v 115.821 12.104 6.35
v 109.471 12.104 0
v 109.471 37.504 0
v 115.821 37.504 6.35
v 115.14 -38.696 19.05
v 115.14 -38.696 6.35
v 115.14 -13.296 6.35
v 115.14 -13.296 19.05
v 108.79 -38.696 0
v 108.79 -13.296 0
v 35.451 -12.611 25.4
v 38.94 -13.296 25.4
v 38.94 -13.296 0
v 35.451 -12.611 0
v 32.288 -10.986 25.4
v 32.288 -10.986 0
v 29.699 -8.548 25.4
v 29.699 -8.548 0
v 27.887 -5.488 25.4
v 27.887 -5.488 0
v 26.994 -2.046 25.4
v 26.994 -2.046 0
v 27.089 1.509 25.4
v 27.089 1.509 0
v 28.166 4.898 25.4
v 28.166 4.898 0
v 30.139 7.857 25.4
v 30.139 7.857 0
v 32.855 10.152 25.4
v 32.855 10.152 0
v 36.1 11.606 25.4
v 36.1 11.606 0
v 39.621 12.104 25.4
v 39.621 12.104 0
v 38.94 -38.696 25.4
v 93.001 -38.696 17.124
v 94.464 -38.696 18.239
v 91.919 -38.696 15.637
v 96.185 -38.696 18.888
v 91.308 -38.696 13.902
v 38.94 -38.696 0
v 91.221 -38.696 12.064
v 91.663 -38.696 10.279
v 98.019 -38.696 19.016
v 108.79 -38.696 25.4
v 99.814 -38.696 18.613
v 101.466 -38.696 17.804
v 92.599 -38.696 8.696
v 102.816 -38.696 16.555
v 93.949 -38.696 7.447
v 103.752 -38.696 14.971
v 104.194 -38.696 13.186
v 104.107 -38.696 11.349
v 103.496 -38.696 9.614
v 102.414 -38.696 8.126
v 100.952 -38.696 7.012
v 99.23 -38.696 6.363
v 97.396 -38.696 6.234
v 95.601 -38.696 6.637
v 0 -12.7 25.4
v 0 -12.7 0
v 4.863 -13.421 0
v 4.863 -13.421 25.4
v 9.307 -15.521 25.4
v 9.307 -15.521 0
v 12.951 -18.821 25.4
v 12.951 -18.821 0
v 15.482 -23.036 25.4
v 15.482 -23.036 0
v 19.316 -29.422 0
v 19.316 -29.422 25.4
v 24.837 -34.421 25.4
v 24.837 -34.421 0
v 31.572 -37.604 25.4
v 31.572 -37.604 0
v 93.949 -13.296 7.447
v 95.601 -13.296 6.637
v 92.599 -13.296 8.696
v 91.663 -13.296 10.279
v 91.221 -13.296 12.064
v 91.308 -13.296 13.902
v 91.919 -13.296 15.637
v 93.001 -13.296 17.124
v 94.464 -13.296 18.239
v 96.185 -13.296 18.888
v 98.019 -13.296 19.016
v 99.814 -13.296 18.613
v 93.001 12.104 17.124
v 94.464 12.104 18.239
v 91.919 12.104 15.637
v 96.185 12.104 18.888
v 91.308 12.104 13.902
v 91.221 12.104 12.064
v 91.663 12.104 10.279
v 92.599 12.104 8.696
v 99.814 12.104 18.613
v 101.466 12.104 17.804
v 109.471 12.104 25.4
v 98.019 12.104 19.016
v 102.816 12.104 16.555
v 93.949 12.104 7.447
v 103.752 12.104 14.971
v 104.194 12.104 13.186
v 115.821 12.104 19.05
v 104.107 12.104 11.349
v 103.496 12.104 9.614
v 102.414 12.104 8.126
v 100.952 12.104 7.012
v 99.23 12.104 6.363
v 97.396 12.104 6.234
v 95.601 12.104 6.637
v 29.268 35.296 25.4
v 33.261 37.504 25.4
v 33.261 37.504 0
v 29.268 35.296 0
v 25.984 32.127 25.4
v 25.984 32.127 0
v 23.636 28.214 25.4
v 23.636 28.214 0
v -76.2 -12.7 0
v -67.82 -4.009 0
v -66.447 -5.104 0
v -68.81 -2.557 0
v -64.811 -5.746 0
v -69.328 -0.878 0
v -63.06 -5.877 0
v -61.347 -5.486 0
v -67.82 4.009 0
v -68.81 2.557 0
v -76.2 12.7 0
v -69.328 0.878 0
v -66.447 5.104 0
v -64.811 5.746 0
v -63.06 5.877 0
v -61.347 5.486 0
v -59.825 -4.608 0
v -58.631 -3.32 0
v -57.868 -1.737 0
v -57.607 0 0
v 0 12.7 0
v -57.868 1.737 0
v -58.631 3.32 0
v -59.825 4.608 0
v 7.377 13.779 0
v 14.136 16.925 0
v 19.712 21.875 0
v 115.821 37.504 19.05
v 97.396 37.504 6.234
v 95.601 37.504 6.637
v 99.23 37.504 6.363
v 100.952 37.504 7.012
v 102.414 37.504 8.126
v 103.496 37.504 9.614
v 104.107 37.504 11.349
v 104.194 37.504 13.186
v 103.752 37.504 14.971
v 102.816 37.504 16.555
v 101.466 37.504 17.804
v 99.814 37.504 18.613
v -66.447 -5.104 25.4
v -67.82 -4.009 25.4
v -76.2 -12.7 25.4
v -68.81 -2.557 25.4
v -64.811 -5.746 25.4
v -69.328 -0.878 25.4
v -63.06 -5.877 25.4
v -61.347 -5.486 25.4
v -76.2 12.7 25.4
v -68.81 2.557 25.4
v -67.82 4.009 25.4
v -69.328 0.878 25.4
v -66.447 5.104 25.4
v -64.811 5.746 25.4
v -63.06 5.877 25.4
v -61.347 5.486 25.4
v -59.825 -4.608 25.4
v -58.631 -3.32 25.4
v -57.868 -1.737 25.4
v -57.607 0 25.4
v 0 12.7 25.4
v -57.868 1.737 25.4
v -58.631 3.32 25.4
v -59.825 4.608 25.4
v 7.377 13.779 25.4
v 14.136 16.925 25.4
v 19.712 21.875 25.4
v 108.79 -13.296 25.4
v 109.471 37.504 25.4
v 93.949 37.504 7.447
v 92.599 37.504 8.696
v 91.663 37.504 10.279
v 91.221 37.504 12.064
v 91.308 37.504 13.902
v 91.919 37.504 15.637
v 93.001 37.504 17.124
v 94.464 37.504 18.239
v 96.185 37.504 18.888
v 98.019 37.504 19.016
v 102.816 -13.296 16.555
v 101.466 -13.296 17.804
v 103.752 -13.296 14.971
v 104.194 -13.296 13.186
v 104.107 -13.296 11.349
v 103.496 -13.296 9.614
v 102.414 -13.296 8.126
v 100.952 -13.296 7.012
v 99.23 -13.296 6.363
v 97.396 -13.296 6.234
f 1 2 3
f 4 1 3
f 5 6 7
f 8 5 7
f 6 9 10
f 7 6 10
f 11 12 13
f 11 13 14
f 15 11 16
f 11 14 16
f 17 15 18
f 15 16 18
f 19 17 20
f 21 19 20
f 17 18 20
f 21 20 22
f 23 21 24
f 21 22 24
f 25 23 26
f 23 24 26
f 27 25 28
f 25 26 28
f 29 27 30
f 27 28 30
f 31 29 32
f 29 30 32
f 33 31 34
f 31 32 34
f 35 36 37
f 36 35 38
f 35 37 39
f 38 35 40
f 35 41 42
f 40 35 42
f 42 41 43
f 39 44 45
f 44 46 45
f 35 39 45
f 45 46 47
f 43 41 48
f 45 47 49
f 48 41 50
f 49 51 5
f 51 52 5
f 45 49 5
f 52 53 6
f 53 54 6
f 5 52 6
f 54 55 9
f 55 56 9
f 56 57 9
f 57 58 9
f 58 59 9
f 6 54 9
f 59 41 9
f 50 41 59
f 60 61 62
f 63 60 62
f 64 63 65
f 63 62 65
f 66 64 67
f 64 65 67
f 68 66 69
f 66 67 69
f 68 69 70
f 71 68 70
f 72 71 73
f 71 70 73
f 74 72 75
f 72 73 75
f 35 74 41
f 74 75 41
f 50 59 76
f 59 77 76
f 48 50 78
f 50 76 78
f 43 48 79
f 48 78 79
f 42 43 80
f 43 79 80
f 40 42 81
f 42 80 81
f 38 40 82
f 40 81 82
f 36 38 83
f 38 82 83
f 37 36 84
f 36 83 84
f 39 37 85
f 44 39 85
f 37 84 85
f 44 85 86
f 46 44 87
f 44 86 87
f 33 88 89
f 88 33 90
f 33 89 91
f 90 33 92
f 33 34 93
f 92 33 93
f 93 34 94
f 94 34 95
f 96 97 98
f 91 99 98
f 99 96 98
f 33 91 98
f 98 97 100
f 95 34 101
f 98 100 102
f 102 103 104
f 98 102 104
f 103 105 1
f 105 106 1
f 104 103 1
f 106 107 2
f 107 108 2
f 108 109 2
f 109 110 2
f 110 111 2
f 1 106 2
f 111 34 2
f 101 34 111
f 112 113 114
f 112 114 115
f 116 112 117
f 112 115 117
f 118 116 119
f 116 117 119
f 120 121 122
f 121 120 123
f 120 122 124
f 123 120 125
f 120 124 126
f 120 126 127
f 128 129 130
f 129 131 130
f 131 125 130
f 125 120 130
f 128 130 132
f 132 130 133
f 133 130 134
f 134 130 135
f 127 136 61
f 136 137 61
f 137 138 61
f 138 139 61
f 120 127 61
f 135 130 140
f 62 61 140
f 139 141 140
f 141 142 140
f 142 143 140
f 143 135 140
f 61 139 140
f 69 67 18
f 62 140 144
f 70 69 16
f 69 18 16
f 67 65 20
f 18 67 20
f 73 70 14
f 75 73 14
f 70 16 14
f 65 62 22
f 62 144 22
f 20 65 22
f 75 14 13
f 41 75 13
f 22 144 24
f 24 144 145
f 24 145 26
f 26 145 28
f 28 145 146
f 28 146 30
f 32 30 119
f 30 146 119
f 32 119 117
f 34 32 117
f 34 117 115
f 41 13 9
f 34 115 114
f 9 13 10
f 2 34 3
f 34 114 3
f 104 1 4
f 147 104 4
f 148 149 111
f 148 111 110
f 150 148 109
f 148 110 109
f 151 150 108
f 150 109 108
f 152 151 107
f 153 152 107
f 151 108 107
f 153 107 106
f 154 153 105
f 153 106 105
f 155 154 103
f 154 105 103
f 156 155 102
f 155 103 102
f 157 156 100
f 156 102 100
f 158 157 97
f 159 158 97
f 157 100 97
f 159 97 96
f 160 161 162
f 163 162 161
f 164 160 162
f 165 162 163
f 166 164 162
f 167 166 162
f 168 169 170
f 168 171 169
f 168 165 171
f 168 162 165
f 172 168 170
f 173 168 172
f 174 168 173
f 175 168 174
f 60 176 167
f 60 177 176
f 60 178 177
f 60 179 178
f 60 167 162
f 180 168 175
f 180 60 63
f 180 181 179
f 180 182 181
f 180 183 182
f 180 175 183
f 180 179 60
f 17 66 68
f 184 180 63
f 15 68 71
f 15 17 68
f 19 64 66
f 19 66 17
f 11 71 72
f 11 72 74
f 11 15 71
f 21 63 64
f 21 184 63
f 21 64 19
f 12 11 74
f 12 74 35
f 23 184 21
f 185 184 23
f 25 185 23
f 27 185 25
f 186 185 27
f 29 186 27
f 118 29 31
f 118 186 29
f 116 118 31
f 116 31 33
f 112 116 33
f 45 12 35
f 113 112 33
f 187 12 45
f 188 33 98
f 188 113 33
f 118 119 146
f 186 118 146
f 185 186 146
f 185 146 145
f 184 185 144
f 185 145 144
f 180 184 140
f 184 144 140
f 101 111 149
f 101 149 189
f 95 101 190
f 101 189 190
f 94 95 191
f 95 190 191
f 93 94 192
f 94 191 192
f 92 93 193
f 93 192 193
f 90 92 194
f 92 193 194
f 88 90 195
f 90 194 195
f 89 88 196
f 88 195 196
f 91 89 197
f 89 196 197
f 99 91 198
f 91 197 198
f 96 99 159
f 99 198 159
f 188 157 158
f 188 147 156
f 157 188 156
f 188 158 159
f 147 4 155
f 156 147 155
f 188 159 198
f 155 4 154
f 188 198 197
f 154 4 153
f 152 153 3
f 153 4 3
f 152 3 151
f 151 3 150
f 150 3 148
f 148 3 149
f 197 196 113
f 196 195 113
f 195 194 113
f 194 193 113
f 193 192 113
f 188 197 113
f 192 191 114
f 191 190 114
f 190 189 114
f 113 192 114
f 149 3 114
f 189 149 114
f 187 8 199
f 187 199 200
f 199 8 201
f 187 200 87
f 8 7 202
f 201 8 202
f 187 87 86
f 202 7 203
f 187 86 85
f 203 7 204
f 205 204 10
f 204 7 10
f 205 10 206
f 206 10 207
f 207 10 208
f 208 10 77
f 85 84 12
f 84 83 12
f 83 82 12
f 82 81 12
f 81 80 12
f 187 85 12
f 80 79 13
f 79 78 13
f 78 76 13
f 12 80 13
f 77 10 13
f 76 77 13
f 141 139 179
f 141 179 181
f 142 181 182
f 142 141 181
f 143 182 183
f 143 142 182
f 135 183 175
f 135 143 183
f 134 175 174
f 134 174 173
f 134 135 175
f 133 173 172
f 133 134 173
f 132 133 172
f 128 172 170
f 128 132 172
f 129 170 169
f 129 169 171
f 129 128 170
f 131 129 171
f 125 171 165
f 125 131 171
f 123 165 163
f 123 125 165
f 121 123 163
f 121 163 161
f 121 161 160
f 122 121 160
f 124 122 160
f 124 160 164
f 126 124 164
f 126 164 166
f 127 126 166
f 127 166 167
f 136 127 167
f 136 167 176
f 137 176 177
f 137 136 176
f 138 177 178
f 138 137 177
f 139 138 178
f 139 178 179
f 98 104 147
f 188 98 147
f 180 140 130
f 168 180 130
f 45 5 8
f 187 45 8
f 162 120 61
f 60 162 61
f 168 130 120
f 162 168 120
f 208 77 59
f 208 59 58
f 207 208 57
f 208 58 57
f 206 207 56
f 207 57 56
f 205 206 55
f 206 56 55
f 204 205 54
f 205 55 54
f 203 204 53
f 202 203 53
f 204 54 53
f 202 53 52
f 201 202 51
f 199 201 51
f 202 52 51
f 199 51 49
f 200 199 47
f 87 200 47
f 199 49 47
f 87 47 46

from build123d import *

# Parameters (mm, degrees)
F0_R       = 5.8934645996
F1_DEPTH   = 25.4
F4_D       = 12.7
F4_ON_F3_D = 12.7
F5_SIZE    = 6.35


with BuildPart() as f1:
    # F0 (on Top) → F1 (new body)
    with BuildSketch(Plane.XY):
        with BuildLine():
            ThreePointArc((23.6362737938, 28.2139556626), (14.1364445597, 16.9249221875), (0, 12.7))
            Line((0, 12.7), (-76.2, 12.7))
            Line((-76.2, 12.7), (-76.2, -12.7))
            Line((-76.2, -12.7), (0, -12.7))
            ThreePointArc((0, -12.7), (9.3073343437, -15.5213038758), (15.4816922387, -23.0355259068))
            ThreePointArc((15.4816922387, -23.0355259068), (24.8374177204, -34.4214869615), (38.9404008269, -38.6964812219))
            Line((38.9404008269, -38.6964812219), (115.1404008269, -38.6964812219))
            Line((115.1404008269, -38.6964812219), (115.1404008269, -13.2964812219))
            Line((115.1404008269, -13.2964812219), (38.9404008269, -13.2964812219))
            ThreePointArc((38.9404008269, -13.2964812219), (26.9165705995, -0.2651159667), (39.6211307376, 12.1035187781))
            Line((39.6211307376, 12.1035187781), (115.8211307376, 12.1035187781))
            Line((115.8211307376, 12.1035187781), (115.8211307376, 37.5035187781))
            Line((115.8211307376, 37.5035187781), (33.2611742348, 37.5035187781))
            ThreePointArc((33.2611742348, 37.5035187781), (27.5216816712, 33.819244205), (23.6362737938, 28.2139556626))
        make_face()
        with Locations((-63.5, 0)):
            Circle(F0_R, mode=Mode.SUBTRACT)
    extrude(amount=F1_DEPTH)

    # F4 (through all)
    with Locations(Plane.XZ.offset(38.6964812219)):
        with Locations((97.5403962757, 12.6839925341)):
            Hole(F4_D / 2)

    # F4 on F3 (through all)
    with Locations(Plane(origin=(0, 37.5035187781, 0), x_dir=(-1, 0, 0), z_dir=(0, 1, 0))):
        with Locations((-97.8747204662, 12.5663767254)):
            Hole(F4_ON_F3_D / 2)

    # F5
    f5_edges = [f1.edges().sort_by_distance(p)[0] for p in [
        (115.140401, -25.996481, 25.4),
        (115.140401, -25.996481, 0),
        (115.821131, 24.803519, 25.4),
        (115.821131, 24.803519, 0),
    ]]
    chamfer(f5_edges, length=F5_SIZE)


solid = f1.part
